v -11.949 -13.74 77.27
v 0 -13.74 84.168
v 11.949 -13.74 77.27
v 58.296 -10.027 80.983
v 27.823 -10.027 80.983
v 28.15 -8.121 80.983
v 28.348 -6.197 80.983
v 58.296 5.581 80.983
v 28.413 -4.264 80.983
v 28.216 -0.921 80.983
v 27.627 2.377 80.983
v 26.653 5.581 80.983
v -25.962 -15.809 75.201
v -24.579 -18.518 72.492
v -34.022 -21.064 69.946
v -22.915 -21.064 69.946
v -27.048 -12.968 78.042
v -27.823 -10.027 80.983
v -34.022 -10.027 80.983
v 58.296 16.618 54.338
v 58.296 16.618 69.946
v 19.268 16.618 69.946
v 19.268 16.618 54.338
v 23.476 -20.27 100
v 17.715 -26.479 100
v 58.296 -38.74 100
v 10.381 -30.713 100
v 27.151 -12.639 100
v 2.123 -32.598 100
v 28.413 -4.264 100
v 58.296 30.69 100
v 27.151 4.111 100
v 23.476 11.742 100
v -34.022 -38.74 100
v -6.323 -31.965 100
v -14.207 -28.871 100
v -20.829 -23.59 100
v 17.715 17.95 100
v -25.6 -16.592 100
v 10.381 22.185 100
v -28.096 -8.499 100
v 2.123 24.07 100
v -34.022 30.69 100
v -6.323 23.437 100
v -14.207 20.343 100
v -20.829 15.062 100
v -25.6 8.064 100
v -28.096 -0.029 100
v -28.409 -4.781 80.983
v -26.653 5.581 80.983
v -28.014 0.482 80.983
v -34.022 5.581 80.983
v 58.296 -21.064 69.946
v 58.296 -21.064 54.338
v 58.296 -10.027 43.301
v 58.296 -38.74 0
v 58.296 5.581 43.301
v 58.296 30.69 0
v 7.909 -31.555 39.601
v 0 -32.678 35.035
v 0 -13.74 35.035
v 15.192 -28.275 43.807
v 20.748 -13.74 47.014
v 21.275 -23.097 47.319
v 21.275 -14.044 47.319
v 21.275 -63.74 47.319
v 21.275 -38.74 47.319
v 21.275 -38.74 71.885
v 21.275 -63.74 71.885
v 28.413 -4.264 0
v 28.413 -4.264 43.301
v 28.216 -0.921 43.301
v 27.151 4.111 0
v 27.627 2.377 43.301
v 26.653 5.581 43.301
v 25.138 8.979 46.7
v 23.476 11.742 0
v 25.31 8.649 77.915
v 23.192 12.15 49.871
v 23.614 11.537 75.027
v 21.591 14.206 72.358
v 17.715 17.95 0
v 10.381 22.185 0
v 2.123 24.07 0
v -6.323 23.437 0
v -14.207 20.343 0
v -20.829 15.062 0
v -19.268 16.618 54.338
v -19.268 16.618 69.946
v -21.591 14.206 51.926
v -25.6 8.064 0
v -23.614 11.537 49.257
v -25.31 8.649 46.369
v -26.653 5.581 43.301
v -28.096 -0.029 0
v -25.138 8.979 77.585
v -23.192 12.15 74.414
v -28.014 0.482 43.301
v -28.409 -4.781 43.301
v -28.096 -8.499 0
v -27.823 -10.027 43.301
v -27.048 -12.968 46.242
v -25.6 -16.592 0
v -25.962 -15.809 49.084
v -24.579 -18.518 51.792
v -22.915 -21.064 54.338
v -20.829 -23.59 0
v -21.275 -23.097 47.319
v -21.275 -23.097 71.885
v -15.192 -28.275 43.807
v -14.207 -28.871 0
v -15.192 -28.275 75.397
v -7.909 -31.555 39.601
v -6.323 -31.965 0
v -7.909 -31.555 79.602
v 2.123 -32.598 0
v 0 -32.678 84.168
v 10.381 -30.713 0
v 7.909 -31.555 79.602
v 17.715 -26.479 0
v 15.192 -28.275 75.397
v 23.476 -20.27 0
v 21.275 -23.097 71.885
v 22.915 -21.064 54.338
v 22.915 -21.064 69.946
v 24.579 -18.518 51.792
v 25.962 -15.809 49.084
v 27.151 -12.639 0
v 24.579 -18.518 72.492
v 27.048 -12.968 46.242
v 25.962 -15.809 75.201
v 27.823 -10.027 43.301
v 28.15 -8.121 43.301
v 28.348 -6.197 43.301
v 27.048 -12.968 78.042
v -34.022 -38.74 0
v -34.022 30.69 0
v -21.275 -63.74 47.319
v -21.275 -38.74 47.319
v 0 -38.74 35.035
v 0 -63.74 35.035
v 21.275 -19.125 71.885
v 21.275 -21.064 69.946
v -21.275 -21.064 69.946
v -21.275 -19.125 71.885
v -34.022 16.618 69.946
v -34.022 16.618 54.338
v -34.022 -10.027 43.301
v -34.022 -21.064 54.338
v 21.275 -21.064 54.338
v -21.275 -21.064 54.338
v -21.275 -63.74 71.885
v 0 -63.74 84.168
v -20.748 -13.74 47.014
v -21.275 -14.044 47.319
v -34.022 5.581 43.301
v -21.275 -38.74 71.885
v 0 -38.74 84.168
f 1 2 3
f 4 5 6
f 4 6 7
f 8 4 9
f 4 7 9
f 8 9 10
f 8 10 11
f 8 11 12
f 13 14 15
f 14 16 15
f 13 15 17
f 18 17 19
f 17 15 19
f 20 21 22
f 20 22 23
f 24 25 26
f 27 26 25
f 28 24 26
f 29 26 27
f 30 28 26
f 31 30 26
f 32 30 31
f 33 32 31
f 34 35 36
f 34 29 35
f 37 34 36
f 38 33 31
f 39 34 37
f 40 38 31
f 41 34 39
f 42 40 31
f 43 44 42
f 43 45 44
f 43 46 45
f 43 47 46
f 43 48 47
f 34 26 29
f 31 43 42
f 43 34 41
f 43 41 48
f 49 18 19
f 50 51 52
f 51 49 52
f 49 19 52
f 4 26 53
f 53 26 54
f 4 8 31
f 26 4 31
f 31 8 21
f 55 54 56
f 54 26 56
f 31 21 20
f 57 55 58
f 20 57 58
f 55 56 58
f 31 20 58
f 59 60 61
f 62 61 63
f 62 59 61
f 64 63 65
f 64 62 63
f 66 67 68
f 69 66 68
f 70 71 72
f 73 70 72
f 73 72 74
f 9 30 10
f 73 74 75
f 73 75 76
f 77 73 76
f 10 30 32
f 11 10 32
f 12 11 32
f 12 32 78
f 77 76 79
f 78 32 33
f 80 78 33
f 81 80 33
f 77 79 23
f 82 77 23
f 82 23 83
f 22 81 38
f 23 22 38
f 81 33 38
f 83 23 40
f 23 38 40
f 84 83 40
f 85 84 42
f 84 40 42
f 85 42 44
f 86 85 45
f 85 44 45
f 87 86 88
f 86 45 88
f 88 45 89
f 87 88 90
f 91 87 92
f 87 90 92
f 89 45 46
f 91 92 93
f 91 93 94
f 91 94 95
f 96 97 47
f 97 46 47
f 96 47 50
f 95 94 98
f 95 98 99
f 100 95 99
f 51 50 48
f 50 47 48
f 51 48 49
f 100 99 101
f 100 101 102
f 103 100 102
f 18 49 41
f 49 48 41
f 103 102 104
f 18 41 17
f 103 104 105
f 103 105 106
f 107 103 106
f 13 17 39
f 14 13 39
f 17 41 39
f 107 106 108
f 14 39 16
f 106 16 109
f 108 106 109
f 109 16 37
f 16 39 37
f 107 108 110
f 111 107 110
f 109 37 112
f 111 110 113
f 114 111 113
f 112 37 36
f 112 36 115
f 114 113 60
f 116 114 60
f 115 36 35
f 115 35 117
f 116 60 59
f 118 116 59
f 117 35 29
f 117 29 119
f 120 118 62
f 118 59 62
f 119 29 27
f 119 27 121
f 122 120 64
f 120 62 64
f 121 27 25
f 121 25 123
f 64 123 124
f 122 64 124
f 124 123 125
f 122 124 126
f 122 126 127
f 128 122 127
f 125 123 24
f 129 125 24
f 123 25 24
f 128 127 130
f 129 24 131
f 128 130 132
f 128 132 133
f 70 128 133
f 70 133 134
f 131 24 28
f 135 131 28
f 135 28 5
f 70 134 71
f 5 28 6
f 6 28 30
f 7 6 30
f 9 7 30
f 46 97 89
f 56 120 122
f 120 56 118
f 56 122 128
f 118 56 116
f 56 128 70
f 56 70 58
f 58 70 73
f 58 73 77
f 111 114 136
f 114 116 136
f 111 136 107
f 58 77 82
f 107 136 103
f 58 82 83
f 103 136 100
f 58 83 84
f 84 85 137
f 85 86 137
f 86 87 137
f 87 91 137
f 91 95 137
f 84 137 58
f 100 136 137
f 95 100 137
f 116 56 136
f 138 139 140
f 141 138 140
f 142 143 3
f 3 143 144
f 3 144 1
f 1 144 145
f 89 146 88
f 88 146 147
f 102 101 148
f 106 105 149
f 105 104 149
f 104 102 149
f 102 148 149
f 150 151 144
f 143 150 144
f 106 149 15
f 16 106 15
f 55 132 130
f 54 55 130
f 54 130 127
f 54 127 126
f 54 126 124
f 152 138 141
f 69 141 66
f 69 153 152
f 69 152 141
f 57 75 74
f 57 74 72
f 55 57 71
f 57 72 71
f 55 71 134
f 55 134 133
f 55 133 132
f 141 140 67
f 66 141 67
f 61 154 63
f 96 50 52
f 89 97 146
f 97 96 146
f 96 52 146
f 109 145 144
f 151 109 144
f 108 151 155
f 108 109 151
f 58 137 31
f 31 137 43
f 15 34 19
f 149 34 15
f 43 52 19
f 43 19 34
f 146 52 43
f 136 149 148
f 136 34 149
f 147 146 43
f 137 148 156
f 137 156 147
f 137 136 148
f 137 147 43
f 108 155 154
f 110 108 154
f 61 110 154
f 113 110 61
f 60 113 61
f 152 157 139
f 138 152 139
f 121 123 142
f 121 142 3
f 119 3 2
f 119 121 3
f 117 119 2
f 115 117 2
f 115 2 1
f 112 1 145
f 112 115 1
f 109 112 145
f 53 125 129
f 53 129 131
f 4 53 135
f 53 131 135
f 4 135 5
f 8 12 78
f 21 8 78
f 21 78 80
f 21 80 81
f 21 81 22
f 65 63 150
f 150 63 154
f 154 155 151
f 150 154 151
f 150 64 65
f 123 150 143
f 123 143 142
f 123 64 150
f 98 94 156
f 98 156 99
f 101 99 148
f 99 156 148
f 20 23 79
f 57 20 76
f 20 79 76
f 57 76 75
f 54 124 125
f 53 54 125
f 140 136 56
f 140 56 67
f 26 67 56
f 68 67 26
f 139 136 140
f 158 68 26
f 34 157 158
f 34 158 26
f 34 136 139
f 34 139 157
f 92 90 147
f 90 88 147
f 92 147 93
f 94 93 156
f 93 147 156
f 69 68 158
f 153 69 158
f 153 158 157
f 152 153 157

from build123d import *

# Parameters (mm, degrees)
F0_W          = 67.3185419291
F0_H          = 69.4296189758
F1_DEPTH      = 100
F2_R          = 28.4134065768
F3_DEPTH      = 100.001
F5_DEPTH      = 25
F5_DEPTH_BACK = 25
F6_DEPTH      = 25
F8_DEPTH      = 92.3195419291


with BuildPart() as f1:
    # F0 (on Top) → F1 (new body)
    with BuildSketch(Plane.XY):
        with Locations((-0.362903811, -4.0251101746)):
            Rectangle(F0_W, F0_H)
    extrude(amount=F1_DEPTH)

    # F2 (on face) → F3 (cut, through all)
    with BuildSketch(Plane.XY.offset(100)):
        with Locations((0, -4.2641130276)):
            Circle(F2_R)
    extrude(amount=-F3_DEPTH, mode=Mode.SUBTRACT)

    # F4 (on face) → F5 (join, two sides)
    with BuildSketch(Plane.XZ.offset(38.7399196625)) as f5_sk:
        Polygon((-21.2752018124, 71.8850533229), (-21.2752018124, 47.318566336), (0, 35.0353228426), (21.2752018124, 47.318566336), (21.2752018124, 71.8850533229), (0, 84.1682968164), align=None)
    extrude(amount=F5_DEPTH)
    extrude(f5_sk.sketch, amount=-F5_DEPTH_BACK)

    # F6 (add): a face of the model
    f6_faces = [f1.faces().sort_by_distance(p)[0] for p in [
        (33.2963671535, -4.0251101746, 50),
    ]]
    extrude(f6_faces, amount=F6_DEPTH)

    # F7 (on face) → F8 (cut, through all)
    with BuildSketch(Plane(origin=(-34.0221747756, 0, 0), x_dir=(0, -1, 0), z_dir=(-1, 0, 0))):
        Polygon((21.0635084659, 54.3380566401), (21.0635084659, 69.9462256865), (10.0268662913, 80.9828678612), (-5.5813027551, 80.9828678612), (-16.6179449297, 69.9462256865), (-16.6179449297, 54.3380566401), (-5.5813027551, 43.3014144655), (10.0268662913, 43.3014144655), align=None)
    extrude(amount=-F8_DEPTH, mode=Mode.SUBTRACT)


solid = f1.part
